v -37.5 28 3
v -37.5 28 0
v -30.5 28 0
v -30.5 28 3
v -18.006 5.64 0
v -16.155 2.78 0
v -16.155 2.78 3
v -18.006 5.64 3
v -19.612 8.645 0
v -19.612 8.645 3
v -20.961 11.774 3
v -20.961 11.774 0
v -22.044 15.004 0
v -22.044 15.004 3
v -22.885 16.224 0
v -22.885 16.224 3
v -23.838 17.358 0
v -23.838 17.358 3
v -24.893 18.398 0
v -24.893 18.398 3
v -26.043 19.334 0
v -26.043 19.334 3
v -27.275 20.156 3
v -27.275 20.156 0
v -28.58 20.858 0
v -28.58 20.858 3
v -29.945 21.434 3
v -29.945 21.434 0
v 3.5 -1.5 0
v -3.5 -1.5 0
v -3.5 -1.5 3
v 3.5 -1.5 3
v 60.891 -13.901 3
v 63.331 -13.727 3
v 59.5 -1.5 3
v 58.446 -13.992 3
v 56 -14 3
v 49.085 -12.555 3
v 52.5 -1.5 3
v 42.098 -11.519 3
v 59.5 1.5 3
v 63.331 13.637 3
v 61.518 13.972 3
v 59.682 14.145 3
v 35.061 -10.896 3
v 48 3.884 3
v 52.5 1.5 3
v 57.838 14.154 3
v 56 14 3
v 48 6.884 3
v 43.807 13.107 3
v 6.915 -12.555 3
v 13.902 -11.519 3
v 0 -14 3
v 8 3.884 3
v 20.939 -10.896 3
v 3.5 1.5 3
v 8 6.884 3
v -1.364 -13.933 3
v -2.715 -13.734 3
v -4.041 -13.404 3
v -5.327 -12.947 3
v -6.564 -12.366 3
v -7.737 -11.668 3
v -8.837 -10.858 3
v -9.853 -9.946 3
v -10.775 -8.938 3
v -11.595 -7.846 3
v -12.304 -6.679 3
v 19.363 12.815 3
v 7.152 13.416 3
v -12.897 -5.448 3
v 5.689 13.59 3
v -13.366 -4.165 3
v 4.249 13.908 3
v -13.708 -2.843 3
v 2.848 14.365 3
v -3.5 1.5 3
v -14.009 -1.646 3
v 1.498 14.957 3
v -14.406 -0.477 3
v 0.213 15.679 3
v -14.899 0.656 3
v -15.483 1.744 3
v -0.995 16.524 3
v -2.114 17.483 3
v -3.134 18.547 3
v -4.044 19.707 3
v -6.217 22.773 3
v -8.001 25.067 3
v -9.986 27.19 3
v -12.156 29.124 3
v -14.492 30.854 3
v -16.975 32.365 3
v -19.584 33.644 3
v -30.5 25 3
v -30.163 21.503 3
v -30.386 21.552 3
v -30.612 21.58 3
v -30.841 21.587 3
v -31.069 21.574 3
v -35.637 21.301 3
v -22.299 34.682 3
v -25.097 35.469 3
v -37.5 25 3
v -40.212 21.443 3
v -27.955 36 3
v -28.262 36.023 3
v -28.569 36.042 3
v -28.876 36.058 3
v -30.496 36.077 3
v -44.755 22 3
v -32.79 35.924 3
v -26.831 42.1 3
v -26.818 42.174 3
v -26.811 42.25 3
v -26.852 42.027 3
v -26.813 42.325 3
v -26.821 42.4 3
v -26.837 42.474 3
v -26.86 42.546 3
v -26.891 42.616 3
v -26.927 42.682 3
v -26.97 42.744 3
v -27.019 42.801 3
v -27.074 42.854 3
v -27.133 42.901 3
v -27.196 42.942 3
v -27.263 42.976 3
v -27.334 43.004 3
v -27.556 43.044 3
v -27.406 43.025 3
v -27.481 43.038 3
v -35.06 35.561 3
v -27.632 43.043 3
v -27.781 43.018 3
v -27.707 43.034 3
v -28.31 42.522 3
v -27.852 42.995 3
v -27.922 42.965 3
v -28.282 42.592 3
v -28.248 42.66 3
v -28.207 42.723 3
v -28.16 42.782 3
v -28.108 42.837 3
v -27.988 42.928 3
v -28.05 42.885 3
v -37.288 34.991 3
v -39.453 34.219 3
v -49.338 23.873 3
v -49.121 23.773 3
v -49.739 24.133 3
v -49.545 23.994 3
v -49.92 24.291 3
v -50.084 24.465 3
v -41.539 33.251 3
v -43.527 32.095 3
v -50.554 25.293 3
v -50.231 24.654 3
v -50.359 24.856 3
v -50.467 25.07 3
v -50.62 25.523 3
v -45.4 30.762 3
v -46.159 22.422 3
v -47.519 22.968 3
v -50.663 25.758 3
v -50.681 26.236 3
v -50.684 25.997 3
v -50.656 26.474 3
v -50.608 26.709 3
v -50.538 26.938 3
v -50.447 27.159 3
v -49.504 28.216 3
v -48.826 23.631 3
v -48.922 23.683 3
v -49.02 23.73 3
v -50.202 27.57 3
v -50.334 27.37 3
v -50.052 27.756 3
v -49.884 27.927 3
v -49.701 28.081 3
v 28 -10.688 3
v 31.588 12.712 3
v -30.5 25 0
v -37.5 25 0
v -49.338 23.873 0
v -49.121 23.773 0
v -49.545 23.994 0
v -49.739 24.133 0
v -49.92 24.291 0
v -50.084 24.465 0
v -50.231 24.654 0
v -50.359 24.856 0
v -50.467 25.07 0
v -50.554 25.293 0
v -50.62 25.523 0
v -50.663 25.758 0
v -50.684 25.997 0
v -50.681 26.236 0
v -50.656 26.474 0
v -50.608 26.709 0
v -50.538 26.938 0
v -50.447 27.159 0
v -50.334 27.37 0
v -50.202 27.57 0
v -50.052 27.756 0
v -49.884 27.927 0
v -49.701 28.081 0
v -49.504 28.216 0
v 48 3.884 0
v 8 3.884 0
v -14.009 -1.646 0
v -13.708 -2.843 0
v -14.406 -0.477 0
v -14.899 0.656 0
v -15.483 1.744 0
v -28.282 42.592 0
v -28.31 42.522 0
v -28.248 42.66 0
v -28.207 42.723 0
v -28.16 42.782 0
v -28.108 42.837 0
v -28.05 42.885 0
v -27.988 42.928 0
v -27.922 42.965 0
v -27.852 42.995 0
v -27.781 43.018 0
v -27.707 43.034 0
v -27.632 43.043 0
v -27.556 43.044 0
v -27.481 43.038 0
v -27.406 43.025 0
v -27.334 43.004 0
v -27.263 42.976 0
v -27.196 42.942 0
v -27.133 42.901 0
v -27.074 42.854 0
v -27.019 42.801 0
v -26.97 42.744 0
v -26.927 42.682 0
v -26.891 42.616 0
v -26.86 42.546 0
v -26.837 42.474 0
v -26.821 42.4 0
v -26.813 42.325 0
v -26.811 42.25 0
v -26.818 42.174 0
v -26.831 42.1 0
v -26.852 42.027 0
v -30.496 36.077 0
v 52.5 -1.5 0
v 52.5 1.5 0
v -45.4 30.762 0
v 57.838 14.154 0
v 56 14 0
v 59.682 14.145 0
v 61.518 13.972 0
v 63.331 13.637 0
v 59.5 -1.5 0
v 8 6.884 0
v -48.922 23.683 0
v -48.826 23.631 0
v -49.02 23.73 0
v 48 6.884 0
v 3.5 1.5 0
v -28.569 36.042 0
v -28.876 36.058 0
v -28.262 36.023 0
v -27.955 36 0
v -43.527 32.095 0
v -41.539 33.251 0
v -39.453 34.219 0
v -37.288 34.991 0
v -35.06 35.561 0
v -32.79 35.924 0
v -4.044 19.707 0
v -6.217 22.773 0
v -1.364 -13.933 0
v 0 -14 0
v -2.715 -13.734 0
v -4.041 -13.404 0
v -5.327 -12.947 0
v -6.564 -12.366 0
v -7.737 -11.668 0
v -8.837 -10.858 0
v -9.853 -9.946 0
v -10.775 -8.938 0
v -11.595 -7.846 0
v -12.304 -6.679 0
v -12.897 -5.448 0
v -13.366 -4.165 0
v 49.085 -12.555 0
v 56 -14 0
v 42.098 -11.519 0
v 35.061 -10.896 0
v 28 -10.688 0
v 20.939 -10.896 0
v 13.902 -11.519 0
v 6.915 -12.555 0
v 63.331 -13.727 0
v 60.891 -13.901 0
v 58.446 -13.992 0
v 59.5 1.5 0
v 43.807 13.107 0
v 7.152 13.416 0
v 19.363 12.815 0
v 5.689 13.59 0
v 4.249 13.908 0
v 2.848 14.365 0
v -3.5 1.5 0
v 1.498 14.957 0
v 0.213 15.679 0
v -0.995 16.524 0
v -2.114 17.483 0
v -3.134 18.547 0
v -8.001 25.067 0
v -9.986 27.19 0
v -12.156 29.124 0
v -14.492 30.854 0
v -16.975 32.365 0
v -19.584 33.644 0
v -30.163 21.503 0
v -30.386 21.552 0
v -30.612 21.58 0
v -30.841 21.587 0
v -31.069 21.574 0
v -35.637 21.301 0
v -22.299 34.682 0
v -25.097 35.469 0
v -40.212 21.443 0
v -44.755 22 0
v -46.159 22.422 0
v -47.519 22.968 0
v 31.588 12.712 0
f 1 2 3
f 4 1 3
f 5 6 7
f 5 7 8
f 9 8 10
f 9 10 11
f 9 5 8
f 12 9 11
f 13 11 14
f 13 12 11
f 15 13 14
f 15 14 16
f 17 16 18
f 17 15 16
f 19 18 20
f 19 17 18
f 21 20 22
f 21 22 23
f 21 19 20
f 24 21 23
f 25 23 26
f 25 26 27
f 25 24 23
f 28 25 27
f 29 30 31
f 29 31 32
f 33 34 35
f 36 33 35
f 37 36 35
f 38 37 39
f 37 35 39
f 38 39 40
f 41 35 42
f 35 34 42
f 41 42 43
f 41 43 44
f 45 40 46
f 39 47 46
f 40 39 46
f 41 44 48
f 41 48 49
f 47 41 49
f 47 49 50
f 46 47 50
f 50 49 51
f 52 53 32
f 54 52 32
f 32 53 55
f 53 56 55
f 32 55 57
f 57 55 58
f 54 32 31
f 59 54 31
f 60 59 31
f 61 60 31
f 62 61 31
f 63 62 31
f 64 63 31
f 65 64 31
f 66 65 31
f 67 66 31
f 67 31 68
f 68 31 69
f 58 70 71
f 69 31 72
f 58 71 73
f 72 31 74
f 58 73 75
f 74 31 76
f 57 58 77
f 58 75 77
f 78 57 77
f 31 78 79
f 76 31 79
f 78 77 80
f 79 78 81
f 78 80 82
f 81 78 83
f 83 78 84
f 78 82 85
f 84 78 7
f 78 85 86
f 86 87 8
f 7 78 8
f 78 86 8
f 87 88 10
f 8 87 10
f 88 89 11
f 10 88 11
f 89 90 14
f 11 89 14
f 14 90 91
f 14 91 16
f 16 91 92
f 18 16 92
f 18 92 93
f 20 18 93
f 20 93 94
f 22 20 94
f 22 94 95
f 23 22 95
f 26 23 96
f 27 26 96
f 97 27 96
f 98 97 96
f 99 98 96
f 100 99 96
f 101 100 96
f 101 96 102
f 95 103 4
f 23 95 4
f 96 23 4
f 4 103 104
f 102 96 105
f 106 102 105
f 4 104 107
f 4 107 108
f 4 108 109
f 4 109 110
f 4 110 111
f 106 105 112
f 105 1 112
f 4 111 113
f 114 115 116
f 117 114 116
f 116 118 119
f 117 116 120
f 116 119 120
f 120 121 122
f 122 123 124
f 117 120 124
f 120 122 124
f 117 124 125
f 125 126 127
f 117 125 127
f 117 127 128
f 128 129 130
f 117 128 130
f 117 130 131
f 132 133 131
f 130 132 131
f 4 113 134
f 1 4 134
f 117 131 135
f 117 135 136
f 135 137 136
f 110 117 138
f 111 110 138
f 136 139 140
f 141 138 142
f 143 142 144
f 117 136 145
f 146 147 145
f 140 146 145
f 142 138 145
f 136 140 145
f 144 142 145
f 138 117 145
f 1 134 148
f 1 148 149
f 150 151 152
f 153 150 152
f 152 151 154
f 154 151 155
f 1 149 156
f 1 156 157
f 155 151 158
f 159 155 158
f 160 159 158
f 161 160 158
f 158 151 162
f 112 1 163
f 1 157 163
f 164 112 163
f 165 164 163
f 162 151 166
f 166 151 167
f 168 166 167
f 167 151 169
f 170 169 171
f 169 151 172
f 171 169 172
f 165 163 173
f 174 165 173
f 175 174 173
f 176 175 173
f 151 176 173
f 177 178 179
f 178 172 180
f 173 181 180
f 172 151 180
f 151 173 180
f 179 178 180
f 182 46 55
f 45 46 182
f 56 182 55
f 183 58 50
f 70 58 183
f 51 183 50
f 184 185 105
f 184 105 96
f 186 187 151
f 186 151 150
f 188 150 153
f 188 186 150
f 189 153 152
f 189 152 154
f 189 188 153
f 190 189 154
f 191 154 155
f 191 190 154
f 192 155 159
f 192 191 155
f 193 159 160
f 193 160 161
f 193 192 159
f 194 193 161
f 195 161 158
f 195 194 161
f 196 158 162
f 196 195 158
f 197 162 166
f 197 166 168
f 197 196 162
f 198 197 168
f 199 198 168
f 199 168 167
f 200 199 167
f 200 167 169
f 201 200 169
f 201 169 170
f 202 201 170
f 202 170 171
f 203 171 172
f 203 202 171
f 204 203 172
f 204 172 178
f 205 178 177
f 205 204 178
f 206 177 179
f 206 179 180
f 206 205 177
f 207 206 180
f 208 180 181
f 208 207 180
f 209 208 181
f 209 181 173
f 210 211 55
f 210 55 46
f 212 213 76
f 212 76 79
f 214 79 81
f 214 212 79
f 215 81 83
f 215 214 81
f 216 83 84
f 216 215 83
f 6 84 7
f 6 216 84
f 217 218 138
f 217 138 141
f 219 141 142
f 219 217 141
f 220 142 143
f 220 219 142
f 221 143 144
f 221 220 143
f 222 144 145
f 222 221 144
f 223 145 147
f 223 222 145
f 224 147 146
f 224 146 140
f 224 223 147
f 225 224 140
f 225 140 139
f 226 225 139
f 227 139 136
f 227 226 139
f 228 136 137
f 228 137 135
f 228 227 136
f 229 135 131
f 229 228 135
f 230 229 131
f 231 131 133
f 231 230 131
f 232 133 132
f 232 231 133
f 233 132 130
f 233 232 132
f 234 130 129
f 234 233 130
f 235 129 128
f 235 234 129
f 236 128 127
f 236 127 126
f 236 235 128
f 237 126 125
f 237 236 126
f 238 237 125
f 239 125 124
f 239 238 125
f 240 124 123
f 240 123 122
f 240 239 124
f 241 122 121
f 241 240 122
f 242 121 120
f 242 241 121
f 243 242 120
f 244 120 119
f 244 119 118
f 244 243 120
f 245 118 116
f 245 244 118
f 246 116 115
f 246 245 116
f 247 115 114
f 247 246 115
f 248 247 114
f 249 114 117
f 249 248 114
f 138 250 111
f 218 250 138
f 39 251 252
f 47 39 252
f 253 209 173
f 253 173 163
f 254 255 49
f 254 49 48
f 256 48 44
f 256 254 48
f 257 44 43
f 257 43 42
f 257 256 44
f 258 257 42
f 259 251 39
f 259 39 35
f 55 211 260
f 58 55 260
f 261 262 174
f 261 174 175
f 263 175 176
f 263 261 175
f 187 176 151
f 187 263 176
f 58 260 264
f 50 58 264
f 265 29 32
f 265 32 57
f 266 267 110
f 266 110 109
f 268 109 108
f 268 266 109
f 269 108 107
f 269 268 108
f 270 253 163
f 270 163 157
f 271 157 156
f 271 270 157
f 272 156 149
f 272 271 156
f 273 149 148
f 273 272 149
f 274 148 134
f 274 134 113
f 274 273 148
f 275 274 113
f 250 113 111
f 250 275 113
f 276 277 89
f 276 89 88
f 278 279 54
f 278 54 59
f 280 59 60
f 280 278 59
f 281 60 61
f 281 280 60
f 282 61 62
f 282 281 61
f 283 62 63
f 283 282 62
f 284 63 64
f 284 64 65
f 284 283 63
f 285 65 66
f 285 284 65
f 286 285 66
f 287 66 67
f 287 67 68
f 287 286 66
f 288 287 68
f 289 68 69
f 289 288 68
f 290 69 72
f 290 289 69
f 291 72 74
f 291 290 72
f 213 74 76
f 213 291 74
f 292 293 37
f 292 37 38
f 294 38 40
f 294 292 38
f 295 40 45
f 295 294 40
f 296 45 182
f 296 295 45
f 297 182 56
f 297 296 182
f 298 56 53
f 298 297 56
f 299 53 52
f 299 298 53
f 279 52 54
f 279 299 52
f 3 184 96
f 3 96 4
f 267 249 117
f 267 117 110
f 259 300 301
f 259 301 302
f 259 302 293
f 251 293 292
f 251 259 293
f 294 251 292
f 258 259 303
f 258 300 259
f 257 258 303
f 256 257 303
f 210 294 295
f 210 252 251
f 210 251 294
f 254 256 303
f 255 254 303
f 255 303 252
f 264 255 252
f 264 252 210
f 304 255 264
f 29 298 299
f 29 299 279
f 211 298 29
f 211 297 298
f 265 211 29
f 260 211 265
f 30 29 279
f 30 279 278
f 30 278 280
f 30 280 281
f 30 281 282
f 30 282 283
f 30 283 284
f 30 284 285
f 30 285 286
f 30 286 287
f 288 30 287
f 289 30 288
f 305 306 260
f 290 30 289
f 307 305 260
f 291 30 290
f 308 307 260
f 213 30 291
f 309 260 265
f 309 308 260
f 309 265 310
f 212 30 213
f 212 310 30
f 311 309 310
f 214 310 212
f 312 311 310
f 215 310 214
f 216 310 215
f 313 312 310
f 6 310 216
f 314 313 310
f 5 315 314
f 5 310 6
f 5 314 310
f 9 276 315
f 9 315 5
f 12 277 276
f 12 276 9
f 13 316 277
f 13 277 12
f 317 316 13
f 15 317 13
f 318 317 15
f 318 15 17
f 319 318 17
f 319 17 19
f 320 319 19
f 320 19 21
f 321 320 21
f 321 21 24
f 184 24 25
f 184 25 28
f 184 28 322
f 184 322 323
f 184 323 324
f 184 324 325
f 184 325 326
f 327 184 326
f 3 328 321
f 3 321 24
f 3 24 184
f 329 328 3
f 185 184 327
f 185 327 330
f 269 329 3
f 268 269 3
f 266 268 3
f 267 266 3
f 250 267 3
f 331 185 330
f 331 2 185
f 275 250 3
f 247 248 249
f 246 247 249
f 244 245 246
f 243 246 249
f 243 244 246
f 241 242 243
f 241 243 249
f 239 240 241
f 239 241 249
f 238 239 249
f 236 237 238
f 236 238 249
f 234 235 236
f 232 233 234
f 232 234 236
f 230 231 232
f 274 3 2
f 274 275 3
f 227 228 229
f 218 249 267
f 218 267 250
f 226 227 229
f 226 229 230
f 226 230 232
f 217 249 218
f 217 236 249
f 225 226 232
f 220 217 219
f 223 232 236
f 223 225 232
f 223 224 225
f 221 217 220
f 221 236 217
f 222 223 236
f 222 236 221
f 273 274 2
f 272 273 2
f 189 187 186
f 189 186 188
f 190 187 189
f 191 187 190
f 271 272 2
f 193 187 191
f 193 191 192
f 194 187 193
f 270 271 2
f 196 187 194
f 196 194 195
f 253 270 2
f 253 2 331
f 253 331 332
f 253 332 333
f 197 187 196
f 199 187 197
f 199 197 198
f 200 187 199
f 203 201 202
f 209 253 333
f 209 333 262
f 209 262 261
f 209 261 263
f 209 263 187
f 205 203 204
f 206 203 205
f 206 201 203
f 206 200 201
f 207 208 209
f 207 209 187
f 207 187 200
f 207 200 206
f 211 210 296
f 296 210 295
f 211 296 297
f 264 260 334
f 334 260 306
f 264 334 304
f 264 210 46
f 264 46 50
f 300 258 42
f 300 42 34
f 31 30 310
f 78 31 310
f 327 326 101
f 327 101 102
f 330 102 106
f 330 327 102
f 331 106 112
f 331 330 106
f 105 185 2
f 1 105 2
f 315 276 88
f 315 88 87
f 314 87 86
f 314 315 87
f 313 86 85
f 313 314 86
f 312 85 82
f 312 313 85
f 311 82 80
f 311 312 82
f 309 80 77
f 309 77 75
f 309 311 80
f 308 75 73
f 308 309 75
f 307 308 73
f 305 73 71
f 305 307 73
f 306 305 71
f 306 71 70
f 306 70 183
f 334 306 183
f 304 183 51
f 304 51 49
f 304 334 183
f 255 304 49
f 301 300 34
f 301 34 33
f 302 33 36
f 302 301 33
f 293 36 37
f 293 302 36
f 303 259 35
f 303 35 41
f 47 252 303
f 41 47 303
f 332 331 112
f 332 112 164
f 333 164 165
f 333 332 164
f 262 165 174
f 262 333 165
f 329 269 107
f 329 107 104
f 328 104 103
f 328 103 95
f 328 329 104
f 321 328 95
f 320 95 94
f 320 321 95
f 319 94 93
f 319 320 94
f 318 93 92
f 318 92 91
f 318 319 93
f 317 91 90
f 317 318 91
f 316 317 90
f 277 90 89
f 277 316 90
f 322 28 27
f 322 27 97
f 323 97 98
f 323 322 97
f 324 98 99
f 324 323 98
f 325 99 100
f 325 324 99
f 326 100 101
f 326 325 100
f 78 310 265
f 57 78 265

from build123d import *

# Parameters (mm, degrees)
CROQUIS1_W              = 7
CROQUIS1_H              = 3
CROQUIS1_W_2            = 40
SALIENTE_EXTRUIR2_DEPTH = 3


with BuildPart() as part:
    # Croquis1 → Saliente-Extruir2 (new body)
    # profile 1 of 2: a face of its own
    with BuildSketch(Plane.XY):
        with BuildLine():
            Line((-6.216662119, 22.772706787), (-4.044005239, 19.70673965))
            ThreePointArc((-4.044005239, 19.70673965), (0.846790636, 15.302410265), (7.152221482, 13.415735026))
            ThreePointArc((7.152221482, 13.415735026), (31.588023052, 12.711932525), (56, 14))
            ThreePointArc((56, 14), (59.681690996, 14.144560896), (63.331119209, 13.637194987))
            Line((63.331119209, 13.637194987), (63.331119209, -13.72746384))
            ThreePointArc((63.331119209, -13.72746384), (59.669008788, -13.956513649), (56, -14))
            ThreePointArc((56, -14), (28, -10.687617167), (0, -14))
            ThreePointArc((0, -14), (-8.837271963, -10.858297484), (-13.708246846, -2.843232035))
            ThreePointArc((-13.708246846, -2.843232035), (-14.641013119, 0.09458105), (-16.154579725, 2.779709497))
            ThreePointArc((-16.154579725, 2.779709497), (-19.611540214, 8.64494659), (-22.043834508, 15.003840083))
            ThreePointArc((-22.043834508, 15.003840083), (-25.456865091, 18.879465716), (-29.94492332, 21.43418393))
            ThreePointArc((-29.94492332, 21.43418393), (-30.498768872, 21.56832041), (-31.068602309, 21.573549568))
            ThreePointArc((-31.068602309, 21.573549568), (-37.926515157, 21.320049962), (-44.755343643, 22.000000093))
            ThreePointArc((-44.755343643, 22.000000093), (-46.844869797, 22.679955064), (-48.825598798, 23.631359783))
            ThreePointArc((-48.825598798, 23.631359783), (-48.970768016, 23.707234664), (-49.120594345, 23.773440183))
            ThreePointArc((-49.120594345, 23.773440183), (-50.676363257, 25.877313669), (-49.50357007, 28.216385428))
            Line((-49.50357007, 28.216385428), (-45.399966171, 30.762281564))
            ThreePointArc((-45.399966171, 30.762281564), (-37.171530842, 35.026305913), (-27.955174947, 35.999874419))
            ThreePointArc((-27.955174947, 35.999874419), (-15.716017532, 31.637687979), (-6.216662119, 22.772706787))
        make_face()
        with Locations((-34, 26.5)):
            Rectangle(CROQUIS1_W, CROQUIS1_H, mode=Mode.SUBTRACT)
        Rectangle(CROQUIS1_W, CROQUIS1_H, mode=Mode.SUBTRACT)
        with Locations((56, 0)):
            Rectangle(CROQUIS1_W, CROQUIS1_H, mode=Mode.SUBTRACT)
        with Locations((28, 5.383929272)):
            Rectangle(CROQUIS1_W_2, CROQUIS1_H, mode=Mode.SUBTRACT)
    # profile 2 of 2: a face of its own
    with BuildSketch(Plane.XY):
        with BuildLine():
            Line((-30.68397036, 35.522018262), (-28.310242026, 42.522018262))
            ThreePointArc((-28.310242026, 42.522018262), (-27.333748746, 43.003952774), (-26.851814233, 42.027459494))
            Line((-26.851814233, 42.027459494), (-29.225542567, 35.027459494))
            ThreePointArc((-29.225542567, 35.027459494), (-30.202035847, 34.545524982), (-30.68397036, 35.522018262))
        make_face()
    extrude(amount=SALIENTE_EXTRUIR2_DEPTH)


solid = part.part
